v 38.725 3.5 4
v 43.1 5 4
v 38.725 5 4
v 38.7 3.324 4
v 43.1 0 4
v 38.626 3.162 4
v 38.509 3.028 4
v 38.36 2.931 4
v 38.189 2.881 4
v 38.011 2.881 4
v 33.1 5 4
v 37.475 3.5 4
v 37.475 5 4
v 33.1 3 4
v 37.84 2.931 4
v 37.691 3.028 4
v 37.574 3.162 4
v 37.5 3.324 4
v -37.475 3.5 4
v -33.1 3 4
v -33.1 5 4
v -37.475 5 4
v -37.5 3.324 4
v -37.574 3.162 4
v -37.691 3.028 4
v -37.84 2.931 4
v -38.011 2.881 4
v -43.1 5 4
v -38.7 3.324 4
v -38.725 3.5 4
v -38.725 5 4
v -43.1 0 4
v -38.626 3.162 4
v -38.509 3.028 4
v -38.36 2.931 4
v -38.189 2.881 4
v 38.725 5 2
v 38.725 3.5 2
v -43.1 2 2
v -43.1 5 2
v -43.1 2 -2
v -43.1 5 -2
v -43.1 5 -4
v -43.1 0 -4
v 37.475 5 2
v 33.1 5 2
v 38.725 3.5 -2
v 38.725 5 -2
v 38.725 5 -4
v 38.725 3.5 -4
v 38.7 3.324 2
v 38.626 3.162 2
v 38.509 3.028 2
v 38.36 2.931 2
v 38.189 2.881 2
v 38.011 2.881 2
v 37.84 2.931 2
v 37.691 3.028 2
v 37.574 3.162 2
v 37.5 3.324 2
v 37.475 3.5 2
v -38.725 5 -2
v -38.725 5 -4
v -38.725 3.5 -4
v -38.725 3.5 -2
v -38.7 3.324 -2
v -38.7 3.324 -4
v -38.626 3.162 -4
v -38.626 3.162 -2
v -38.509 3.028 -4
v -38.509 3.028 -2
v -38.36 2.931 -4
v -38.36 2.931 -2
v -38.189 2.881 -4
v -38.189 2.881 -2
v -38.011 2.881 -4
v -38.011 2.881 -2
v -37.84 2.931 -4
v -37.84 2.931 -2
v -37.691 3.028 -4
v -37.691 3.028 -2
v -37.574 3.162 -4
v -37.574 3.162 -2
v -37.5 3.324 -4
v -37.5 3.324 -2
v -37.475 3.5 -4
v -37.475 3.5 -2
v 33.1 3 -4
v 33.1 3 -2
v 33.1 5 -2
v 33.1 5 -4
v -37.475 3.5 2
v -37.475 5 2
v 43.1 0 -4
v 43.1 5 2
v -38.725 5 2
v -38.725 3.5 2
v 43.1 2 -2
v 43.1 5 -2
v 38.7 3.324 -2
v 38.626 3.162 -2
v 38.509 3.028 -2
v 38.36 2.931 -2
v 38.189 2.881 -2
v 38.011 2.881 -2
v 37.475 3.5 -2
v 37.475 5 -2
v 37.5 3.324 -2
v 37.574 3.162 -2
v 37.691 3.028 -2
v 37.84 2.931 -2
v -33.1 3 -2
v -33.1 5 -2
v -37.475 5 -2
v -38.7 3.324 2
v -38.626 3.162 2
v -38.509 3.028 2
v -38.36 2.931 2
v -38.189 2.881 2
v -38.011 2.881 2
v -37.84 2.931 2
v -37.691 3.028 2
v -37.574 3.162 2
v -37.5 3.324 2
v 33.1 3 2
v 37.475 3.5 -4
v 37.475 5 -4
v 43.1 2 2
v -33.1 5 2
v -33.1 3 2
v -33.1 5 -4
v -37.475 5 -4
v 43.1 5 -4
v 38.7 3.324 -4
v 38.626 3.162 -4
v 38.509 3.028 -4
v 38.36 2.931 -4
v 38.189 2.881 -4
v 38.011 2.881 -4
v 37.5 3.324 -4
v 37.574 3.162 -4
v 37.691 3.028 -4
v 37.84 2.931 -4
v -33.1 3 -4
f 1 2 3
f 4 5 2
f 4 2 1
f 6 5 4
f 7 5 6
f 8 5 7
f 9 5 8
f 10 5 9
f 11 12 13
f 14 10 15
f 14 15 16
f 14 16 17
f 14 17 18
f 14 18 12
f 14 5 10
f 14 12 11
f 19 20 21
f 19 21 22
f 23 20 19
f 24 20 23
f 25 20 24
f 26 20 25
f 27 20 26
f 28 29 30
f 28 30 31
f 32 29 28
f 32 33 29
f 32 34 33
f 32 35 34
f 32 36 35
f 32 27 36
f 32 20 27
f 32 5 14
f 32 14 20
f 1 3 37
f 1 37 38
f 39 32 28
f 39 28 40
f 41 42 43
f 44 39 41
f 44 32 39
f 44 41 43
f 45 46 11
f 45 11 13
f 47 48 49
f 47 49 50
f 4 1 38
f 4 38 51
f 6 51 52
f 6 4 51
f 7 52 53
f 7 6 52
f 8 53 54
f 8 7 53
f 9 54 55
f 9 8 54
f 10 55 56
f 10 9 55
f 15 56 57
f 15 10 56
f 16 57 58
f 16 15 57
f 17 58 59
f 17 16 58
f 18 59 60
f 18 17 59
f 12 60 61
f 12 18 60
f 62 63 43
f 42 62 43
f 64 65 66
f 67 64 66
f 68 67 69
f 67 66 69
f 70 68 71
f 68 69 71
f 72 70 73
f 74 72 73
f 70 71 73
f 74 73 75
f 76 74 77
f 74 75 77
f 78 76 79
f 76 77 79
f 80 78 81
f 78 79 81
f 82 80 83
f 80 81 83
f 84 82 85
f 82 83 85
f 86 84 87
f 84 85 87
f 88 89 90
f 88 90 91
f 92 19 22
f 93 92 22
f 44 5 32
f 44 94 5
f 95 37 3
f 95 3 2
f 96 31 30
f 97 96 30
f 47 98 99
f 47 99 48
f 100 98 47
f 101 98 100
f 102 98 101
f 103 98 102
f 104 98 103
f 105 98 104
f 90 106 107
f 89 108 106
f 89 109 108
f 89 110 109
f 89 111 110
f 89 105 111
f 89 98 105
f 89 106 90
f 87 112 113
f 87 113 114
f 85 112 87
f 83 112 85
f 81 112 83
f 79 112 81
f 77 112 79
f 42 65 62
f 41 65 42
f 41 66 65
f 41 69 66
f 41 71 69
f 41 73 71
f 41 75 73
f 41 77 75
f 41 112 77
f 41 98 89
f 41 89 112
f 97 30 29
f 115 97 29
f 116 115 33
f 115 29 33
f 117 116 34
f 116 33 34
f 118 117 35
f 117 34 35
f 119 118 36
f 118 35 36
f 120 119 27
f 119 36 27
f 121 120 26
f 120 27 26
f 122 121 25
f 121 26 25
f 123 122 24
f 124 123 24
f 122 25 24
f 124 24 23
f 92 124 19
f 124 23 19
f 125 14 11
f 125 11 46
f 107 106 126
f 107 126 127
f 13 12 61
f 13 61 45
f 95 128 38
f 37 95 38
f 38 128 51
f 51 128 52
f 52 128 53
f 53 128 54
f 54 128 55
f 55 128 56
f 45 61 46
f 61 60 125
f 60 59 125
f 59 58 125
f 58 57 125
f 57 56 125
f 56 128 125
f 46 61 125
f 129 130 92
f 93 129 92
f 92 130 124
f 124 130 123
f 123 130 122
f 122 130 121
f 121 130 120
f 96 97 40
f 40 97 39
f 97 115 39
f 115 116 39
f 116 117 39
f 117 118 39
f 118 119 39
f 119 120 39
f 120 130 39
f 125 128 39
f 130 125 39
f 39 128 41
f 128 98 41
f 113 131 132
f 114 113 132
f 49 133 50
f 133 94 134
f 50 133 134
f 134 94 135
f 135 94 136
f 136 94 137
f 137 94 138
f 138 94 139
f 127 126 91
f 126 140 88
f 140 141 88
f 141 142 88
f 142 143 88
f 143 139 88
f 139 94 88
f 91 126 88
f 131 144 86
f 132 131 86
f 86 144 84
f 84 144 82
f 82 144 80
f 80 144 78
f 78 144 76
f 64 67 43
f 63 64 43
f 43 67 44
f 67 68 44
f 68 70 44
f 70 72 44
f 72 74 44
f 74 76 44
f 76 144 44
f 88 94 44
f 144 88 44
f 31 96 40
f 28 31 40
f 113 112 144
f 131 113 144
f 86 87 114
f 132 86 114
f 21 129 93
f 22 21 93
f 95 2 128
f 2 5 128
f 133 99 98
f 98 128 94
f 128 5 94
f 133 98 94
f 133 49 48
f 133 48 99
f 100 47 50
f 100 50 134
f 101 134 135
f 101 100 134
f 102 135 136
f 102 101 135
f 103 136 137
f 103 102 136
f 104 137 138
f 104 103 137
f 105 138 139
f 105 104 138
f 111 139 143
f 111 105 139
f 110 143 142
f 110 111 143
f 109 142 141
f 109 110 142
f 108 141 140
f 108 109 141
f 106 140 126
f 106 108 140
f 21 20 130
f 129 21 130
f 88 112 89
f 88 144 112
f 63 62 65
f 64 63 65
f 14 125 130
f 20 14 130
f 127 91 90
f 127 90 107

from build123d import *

# Parameters (mm, degrees)
SKETCH1_W           = 43.1
SKETCH1_H           = 8
BOSS_EXTRUDE1_DEPTH = 2
SKETCH2_W           = 10
SKETCH2_H           = 2
BOSS_EXTRUDE2_DEPTH = 3
SKETCH3_W           = 33.1
SKETCH3_H           = 2
BOSS_EXTRUDE3_DEPTH = 1
CUT_EXTRUDE1_DEPTH  = 45.120403443


with BuildPart() as part:
    # Sketch1 → Boss-Extrude1 (new body)
    with BuildSketch(Plane(origin=(0, 0, 0), x_dir=(1, 0, 0), z_dir=(0, 1, 0))):
        with Locations((21.55, 0)):
            Rectangle(SKETCH1_W, SKETCH1_H)
    boss_extrude1 = extrude(amount=BOSS_EXTRUDE1_DEPTH)

    # Sketch2 → Boss-Extrude2 (add)
    with BuildSketch(Plane(origin=(0, 2, 0), x_dir=(1, 0, 0), z_dir=(0, 1, 0))):
        with Locations((38.1, -3)):
            Rectangle(SKETCH2_W, SKETCH2_H)
        with Locations((38.1, 3)):
            Rectangle(SKETCH2_W, SKETCH2_H)
    boss_extrude2 = extrude(amount=BOSS_EXTRUDE2_DEPTH)

    # Sketch3 → Boss-Extrude3 (add)
    with BuildSketch(Plane(origin=(0, 2, 0), x_dir=(1, 0, 0), z_dir=(0, 1, 0))):
        with Locations((16.55, -3)):
            Rectangle(SKETCH3_W, SKETCH3_H)
        with Locations((16.55, 3)):
            Rectangle(SKETCH3_W, SKETCH3_H)
    boss_extrude3 = extrude(amount=BOSS_EXTRUDE3_DEPTH)

    # Sketch4 → Cut-Extrude1 (cut, through all)
    with BuildSketch(Plane.XY.offset(4)):
        with BuildLine():
            Line((37.475, 3.5), (37.475, 5))
            Line((37.475, 5), (38.725, 5))
            Line((38.725, 5), (38.725, 3.5))
            ThreePointArc((38.725, 3.5), (38.1, 2.875), (37.475, 3.5))
        make_face()
    cut_extrude1 = extrude(amount=-CUT_EXTRUDE1_DEPTH, mode=Mode.SUBTRACT)

    # Mirror1: Boss-Extrude1, Boss-Extrude2, Boss-Extrude3, Cut-Extrude1 across plane
    add(boss_extrude1.mirror(Plane(origin=(0, 0, 0), x_dir=(0, 0, 1), z_dir=(1, 0, 0))))
    add(boss_extrude2.mirror(Plane(origin=(0, 0, 0), x_dir=(0, 0, 1), z_dir=(1, 0, 0))))
    add(boss_extrude3.mirror(Plane(origin=(0, 0, 0), x_dir=(0, 0, 1), z_dir=(1, 0, 0))))
    add(cut_extrude1.mirror(Plane(origin=(0, 0, 0), x_dir=(0, 0, 1), z_dir=(1, 0, 0))), mode=Mode.SUBTRACT)


solid = part.part
